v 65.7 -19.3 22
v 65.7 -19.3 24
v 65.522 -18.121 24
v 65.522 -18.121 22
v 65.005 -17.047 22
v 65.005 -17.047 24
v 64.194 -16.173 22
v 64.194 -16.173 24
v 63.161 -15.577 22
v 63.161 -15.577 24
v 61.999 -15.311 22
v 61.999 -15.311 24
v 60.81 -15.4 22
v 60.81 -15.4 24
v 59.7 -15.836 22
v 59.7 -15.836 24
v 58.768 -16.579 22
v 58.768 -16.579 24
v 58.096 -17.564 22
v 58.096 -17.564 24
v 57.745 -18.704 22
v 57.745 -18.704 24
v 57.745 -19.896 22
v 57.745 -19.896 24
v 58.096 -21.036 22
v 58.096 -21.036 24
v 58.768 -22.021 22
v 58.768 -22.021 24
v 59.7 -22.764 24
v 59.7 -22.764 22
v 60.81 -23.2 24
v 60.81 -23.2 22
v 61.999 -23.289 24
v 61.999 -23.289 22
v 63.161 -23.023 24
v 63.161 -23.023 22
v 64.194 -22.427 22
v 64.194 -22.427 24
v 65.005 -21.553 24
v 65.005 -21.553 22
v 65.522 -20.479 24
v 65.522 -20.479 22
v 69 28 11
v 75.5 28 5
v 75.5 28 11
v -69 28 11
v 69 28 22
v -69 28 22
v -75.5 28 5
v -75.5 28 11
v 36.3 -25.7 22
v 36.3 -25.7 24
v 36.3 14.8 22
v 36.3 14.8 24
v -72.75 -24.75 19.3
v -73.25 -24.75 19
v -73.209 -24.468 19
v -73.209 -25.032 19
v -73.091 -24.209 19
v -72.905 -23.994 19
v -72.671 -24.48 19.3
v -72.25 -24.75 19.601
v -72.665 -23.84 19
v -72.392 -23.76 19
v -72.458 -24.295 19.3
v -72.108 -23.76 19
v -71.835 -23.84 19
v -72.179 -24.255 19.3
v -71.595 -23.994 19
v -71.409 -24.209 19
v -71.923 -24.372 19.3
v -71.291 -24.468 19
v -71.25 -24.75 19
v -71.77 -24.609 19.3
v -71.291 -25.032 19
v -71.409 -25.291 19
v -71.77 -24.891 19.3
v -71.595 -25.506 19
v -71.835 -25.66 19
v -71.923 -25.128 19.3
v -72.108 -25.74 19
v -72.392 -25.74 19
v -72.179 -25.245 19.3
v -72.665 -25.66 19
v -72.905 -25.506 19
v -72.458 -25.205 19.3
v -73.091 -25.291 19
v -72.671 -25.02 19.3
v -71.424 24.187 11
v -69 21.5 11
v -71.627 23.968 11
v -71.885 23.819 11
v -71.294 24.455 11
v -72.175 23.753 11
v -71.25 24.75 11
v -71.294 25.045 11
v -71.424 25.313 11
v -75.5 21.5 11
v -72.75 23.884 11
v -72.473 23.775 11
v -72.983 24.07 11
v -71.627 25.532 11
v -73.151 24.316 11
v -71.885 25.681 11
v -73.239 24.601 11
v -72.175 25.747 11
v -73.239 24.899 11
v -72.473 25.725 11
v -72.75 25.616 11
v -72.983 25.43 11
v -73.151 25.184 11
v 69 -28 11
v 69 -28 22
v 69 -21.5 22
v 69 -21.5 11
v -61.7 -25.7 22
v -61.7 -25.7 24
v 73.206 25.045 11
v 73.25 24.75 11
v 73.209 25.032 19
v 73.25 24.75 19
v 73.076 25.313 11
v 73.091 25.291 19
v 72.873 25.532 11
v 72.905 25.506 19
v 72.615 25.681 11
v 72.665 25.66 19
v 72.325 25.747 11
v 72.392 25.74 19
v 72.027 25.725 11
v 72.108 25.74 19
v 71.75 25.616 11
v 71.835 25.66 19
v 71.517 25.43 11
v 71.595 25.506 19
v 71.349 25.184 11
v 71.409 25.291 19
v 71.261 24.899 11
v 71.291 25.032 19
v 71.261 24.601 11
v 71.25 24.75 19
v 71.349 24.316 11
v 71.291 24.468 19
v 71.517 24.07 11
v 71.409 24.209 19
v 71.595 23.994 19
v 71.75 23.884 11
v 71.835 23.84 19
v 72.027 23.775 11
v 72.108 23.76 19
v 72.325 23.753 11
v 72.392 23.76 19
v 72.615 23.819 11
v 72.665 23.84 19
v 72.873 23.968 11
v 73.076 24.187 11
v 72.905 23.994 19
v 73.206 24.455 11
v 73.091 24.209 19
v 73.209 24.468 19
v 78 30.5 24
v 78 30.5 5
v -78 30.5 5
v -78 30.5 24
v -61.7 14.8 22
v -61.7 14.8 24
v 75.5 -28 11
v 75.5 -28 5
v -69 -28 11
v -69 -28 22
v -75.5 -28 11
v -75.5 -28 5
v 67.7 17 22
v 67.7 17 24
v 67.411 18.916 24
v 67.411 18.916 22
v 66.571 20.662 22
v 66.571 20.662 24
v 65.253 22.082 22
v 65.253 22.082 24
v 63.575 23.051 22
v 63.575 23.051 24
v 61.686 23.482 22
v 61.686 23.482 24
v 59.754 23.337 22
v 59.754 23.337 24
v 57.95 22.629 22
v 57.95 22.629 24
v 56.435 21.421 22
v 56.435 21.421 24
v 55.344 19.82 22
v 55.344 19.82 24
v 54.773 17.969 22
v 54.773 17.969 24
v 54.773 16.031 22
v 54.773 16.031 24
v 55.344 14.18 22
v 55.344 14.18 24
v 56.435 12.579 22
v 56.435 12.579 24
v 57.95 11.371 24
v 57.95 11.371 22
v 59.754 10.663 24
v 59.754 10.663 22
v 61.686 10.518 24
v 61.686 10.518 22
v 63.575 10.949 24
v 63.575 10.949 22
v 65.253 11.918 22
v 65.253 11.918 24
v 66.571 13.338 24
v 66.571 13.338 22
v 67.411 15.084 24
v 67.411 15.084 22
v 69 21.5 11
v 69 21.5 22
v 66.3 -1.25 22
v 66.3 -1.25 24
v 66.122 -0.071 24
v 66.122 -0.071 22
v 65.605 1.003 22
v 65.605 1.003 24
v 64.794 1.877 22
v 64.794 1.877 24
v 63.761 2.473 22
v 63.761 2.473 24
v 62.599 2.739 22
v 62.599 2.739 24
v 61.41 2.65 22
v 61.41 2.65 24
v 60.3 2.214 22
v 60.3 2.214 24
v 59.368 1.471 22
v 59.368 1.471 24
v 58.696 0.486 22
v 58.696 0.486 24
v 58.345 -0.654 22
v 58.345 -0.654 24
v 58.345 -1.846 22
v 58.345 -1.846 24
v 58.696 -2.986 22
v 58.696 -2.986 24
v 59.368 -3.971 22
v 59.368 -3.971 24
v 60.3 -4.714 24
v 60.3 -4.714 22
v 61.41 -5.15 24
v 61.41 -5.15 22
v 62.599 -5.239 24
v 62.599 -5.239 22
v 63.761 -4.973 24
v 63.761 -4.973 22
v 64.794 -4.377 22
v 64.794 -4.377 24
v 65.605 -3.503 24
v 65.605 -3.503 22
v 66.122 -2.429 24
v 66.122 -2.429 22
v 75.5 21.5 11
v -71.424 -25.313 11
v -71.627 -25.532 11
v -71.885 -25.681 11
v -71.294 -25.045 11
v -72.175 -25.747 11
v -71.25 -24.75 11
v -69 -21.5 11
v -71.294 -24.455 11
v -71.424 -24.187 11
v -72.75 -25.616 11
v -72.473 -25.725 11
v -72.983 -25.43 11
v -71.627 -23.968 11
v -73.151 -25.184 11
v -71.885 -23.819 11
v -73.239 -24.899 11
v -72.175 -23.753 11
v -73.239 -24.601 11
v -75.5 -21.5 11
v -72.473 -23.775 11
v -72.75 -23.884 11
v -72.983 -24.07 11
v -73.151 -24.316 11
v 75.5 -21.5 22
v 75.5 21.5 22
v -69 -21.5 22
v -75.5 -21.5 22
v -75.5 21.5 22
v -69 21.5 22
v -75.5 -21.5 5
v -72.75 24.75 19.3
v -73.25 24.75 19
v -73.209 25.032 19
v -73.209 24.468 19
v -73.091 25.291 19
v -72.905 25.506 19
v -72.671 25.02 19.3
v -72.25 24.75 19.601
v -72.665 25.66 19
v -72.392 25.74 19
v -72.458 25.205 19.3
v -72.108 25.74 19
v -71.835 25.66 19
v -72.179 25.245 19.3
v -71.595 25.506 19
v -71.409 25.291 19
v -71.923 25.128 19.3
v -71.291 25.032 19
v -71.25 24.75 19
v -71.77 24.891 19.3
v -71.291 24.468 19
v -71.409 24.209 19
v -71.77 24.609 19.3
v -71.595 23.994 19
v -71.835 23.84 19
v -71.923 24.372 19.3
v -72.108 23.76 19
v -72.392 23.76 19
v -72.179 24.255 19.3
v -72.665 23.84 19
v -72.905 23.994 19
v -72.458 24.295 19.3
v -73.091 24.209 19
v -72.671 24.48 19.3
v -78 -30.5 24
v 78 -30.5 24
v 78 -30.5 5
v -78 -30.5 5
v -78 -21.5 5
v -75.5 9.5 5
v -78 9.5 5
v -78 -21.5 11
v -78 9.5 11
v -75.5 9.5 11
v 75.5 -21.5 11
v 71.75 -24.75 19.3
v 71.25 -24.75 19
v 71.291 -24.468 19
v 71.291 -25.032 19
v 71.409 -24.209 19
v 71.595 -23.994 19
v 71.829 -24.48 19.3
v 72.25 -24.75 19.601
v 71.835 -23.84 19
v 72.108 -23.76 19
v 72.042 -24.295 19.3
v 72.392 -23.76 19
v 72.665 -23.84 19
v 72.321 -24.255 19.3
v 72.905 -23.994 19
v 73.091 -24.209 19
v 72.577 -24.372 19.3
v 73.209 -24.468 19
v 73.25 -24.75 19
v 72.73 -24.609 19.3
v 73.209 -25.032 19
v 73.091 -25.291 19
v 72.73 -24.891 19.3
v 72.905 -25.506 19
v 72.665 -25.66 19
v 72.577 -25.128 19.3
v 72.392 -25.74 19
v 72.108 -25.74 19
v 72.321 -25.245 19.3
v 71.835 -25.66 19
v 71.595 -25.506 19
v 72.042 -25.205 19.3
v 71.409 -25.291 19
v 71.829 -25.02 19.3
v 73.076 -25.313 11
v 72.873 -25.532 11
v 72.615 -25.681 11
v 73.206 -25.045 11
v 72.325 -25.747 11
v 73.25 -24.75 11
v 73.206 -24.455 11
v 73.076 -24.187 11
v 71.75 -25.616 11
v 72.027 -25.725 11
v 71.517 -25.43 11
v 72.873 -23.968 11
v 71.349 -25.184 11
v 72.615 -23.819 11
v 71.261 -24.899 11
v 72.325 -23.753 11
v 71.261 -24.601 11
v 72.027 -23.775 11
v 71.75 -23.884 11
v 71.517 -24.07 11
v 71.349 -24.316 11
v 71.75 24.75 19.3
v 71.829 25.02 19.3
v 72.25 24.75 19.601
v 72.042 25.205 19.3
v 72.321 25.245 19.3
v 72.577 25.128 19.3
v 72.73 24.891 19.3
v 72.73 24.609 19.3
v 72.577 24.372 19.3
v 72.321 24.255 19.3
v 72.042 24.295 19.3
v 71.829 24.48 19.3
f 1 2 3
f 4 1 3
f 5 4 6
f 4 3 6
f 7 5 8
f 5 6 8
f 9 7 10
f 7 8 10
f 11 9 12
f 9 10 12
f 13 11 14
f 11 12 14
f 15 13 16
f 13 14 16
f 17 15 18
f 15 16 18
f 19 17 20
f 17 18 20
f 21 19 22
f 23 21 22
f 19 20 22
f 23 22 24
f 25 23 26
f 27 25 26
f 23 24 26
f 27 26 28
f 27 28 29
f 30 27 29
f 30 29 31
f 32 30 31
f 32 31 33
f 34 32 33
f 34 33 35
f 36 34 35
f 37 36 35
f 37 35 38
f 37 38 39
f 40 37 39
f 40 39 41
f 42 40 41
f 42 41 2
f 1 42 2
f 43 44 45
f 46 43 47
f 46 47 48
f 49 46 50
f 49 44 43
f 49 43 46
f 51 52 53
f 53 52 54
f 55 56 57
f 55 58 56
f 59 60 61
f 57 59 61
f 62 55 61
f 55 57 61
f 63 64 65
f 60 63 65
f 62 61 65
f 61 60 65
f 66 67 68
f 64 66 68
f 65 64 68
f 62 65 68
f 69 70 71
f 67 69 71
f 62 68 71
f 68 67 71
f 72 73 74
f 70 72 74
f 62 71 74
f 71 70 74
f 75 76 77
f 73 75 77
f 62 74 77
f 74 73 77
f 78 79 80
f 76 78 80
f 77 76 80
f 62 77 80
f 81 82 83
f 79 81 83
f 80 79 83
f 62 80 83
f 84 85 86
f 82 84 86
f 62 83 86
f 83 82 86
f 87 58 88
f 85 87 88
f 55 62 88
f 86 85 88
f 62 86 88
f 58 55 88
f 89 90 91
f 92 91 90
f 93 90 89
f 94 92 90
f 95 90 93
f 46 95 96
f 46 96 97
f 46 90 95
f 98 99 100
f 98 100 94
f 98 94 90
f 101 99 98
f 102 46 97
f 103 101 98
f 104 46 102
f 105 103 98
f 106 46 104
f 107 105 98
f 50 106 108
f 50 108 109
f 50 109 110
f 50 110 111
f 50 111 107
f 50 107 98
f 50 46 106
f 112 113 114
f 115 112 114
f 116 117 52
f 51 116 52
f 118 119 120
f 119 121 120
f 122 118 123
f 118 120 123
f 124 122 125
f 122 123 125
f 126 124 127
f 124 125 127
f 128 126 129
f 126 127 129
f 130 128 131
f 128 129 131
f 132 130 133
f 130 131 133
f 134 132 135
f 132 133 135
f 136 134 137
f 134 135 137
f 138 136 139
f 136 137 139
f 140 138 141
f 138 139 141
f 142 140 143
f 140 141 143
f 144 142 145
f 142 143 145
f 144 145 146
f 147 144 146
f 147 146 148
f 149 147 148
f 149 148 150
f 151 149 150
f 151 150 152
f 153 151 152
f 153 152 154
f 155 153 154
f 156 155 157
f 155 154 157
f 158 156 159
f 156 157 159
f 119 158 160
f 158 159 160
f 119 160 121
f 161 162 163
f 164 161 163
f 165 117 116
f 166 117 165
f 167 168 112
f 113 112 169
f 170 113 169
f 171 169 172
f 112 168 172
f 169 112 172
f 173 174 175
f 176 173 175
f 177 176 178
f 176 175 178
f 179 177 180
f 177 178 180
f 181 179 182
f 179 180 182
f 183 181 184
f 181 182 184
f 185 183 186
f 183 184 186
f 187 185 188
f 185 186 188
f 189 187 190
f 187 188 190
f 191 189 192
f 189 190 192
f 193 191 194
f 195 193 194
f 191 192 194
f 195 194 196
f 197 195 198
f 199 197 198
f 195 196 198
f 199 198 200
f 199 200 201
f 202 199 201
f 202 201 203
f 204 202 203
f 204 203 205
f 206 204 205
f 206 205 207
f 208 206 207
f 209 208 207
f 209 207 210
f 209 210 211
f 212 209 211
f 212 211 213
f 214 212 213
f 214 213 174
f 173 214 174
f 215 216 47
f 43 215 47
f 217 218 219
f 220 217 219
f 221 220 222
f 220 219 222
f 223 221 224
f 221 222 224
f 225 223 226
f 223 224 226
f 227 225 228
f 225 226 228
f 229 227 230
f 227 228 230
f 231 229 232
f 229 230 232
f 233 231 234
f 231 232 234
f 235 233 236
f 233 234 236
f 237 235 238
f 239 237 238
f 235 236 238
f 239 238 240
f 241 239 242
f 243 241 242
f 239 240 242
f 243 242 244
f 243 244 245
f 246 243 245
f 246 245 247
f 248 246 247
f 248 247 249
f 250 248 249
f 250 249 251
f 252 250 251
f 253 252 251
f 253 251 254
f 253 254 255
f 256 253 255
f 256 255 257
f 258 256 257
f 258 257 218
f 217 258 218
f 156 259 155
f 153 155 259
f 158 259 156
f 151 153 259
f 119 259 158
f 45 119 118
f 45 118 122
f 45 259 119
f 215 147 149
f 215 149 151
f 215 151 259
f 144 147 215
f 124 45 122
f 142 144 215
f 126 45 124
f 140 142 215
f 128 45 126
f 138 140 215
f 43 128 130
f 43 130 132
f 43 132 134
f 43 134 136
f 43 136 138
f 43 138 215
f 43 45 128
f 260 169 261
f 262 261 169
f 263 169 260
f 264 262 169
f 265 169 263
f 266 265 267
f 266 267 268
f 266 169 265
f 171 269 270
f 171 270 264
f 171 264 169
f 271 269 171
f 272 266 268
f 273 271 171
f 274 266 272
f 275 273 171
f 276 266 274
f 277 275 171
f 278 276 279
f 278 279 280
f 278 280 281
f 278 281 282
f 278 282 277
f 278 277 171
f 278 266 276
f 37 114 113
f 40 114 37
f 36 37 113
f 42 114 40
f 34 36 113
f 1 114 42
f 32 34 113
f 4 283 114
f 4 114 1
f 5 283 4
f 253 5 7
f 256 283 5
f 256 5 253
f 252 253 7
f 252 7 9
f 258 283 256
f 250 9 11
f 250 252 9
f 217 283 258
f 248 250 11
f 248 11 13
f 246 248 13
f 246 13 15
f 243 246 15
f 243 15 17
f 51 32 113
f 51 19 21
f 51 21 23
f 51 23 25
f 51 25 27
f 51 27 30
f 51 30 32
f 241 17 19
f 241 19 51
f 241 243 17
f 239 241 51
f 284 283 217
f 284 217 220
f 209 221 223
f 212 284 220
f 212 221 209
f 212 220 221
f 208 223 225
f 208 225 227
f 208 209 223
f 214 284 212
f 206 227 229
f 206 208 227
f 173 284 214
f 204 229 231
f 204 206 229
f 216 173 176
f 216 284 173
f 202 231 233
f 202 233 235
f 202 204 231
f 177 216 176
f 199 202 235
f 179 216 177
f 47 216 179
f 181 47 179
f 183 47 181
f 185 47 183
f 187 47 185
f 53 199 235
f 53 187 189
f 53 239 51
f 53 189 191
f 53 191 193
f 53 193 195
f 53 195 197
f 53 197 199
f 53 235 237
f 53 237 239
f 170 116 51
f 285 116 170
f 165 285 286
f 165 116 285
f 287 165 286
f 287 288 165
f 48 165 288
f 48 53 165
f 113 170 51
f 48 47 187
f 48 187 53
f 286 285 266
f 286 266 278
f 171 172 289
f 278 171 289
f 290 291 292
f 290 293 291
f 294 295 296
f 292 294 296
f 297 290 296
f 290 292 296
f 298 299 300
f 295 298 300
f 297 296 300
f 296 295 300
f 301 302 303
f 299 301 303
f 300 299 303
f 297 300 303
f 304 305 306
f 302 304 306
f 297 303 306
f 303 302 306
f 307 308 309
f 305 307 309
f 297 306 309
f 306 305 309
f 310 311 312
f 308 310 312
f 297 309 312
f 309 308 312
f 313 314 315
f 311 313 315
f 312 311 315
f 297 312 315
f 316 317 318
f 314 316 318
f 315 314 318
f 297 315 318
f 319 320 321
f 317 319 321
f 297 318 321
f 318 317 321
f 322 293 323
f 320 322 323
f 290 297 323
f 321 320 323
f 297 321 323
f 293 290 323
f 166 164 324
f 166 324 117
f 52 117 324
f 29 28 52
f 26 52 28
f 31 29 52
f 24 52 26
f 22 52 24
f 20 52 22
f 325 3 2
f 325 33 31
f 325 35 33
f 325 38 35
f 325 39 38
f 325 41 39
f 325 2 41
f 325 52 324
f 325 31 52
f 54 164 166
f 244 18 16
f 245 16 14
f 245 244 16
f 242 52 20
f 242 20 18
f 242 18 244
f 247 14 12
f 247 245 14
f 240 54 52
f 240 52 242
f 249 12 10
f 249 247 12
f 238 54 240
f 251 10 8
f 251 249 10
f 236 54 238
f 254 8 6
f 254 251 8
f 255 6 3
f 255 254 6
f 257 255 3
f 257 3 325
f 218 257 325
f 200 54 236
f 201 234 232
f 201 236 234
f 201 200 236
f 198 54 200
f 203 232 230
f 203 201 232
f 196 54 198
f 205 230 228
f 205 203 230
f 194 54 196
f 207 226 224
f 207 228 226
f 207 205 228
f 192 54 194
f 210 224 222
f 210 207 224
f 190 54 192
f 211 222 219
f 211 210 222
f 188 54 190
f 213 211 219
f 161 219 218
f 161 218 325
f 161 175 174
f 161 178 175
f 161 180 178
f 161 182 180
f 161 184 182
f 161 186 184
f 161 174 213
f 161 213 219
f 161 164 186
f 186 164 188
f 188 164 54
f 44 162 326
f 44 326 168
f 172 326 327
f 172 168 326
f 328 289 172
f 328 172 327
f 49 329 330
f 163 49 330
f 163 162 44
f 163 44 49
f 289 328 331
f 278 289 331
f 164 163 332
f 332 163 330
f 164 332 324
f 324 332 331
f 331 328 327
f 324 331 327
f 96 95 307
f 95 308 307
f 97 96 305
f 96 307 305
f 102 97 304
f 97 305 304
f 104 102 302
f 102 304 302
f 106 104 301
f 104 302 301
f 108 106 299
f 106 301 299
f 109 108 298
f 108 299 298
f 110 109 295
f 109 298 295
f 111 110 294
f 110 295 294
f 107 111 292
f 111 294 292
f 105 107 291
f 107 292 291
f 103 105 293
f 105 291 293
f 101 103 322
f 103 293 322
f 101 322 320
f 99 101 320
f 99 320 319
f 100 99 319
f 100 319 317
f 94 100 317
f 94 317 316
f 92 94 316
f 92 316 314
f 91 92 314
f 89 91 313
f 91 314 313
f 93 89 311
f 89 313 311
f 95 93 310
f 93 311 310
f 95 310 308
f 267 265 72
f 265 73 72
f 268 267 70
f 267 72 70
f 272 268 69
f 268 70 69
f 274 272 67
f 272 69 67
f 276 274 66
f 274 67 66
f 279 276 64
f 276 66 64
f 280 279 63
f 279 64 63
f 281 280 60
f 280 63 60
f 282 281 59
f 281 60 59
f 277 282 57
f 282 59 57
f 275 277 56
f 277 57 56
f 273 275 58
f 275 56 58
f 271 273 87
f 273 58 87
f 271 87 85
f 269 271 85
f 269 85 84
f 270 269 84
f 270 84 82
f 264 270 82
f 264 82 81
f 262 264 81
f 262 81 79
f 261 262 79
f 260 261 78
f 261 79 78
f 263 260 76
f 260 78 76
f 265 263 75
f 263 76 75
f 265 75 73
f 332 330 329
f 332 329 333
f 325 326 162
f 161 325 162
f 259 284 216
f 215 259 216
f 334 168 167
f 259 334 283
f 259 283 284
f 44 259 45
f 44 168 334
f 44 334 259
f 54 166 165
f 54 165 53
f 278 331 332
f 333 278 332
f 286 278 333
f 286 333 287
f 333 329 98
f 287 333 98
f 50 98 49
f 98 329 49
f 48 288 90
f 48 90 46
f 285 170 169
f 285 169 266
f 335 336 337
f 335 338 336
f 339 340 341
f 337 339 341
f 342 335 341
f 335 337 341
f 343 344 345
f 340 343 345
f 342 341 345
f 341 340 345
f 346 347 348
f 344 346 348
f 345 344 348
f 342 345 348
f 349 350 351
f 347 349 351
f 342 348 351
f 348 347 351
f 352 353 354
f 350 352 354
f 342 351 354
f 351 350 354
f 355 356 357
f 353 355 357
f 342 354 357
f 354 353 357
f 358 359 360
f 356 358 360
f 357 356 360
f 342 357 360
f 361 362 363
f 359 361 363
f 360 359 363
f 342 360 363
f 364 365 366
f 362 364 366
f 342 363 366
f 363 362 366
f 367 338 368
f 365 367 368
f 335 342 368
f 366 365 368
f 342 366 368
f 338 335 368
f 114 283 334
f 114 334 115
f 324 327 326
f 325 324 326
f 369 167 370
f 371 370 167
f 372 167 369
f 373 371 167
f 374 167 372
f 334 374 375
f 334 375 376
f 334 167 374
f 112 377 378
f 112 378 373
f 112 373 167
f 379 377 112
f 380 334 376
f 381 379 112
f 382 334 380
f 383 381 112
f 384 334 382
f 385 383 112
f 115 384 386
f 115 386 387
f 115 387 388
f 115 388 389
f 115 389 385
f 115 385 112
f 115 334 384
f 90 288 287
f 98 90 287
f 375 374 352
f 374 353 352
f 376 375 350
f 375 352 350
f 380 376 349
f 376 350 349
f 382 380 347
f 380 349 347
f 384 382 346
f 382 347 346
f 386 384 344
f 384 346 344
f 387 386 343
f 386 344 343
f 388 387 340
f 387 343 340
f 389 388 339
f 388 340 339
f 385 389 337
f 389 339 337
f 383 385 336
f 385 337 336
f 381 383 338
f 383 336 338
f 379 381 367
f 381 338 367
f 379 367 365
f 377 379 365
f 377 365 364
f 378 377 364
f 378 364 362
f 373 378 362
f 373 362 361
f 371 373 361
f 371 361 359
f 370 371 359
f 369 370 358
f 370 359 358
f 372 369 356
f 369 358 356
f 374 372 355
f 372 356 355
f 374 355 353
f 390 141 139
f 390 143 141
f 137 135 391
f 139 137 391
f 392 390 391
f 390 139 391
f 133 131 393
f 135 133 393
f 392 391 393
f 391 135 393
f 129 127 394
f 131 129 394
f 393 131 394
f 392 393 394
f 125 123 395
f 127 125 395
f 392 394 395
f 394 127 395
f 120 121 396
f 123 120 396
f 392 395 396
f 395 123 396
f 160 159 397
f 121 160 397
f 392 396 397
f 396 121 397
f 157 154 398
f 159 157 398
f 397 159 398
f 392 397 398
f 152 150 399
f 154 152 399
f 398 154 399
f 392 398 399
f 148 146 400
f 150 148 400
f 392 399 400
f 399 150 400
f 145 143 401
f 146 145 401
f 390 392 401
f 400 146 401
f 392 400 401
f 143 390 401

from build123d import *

# Parameters (mm, degrees)
BOSS_EXTRUDE1_DEPTH                                 = 24
SKETCH2_W                                           = 151
SKETCH2_H                                           = 56
CUT_EXTRUDE1_DEPTH                                  = 22
SKETCH3_W                                           = 156
SKETCH3_H                                           = 61
CUT_EXTRUDE2_DEPTH                                  = 5
SKETCH4_R                                           = 6.5
SKETCH4_R_2                                         = 4
SKETCH4_W                                           = 98
SKETCH4_H                                           = 40.5
CUT_EXTRUDE3_DEPTH                                  = 4
CBORE_FOR_M4_HEX_SOCKET_HEAD_CAP_SCREW1_D           = 4.5
CBORE_FOR_M4_HEX_SOCKET_HEAD_CAP_SCREW1_CBORE_D     = 8
CBORE_FOR_M4_HEX_SOCKET_HEAD_CAP_SCREW1_CBORE_DEPTH = 4.4
SKETCH7_W                                           = 6.5
SKETCH7_H                                           = 6.5
BOSS_EXTRUDE2_DEPTH                                 = 11
F_2_0MM_DOWEL_HOLE1_D                               = 2
F_2_0MM_DOWEL_HOLE1_DEPTH                           = 8
F_2_0MM_DOWEL_HOLE1_TIP                             = 0.600860619
SKETCH13_W                                          = 15
SKETCH13_H                                          = 20
CUT_EXTRUDE6_DEPTH                                  = 24
SKETCH14_W                                          = 6
SKETCH14_H                                          = 31
CUT_EXTRUDE7_DEPTH                                  = 3


with BuildPart() as part:
    # Sketch1 → Boss-Extrude1 (new body)
    with BuildSketch(Plane.XY):
        Polygon((-93, 10.5), (-78, 10.5), (-78, -30.5), (78, -30.5), (78, 10.5), (93, 10.5), (93, 30.5), (-93, 30.5), align=None)
    extrude(amount=BOSS_EXTRUDE1_DEPTH)

    # Sketch2 → Cut-Extrude1 (cut)
    with BuildSketch(Plane(origin=(0, 0, 0), x_dir=(-1, 0, 0), z_dir=(0, 0, -1))):
        Rectangle(SKETCH2_W, SKETCH2_H)
    extrude(amount=-CUT_EXTRUDE1_DEPTH, mode=Mode.SUBTRACT)

    # Sketch3 → Cut-Extrude2 (cut)
    with BuildSketch(Plane(origin=(0, 0, 0), x_dir=(-1, 0, 0), z_dir=(0, 0, -1))):
        Rectangle(SKETCH3_W, SKETCH3_H)
    extrude(amount=-CUT_EXTRUDE2_DEPTH, mode=Mode.SUBTRACT)

    # Sketch4 → Cut-Extrude3 (cut)
    with BuildSketch(Plane.XY.offset(24)):
        with Locations((61.2, 17)):
            Circle(SKETCH4_R)
        with Locations((62.3, -1.25)):
            Circle(SKETCH4_R_2)
        with Locations((61.7, -19.3)):
            Circle(SKETCH4_R_2)
        with Locations((-12.7, -5.45)):
            Rectangle(SKETCH4_W, SKETCH4_H)
    extrude(amount=-CUT_EXTRUDE3_DEPTH, mode=Mode.SUBTRACT)

    # CBORE for M4 Hex Socket Head Cap Screw1 (through all)
    with Locations(Plane.XY.offset(24)):
        with Locations((-85, 20.5), (85, 20.376125295)):
            CounterBoreHole(CBORE_FOR_M4_HEX_SOCKET_HEAD_CAP_SCREW1_D / 2, CBORE_FOR_M4_HEX_SOCKET_HEAD_CAP_SCREW1_CBORE_D / 2, CBORE_FOR_M4_HEX_SOCKET_HEAD_CAP_SCREW1_CBORE_DEPTH)

    # Sketch7 → Boss-Extrude2 (add)
    with BuildSketch(Plane(origin=(0, 0, 22), x_dir=(-1, 0, 0), z_dir=(0, 0, -1))):
        with Locations((-72.25, 24.75)):
            Rectangle(SKETCH7_W, SKETCH7_H)
        with Locations((-72.25, -24.75)):
            Rectangle(SKETCH7_W, SKETCH7_H)
        with Locations((72.25, 24.75)):
            Rectangle(SKETCH7_W, SKETCH7_H)
        with Locations((72.25, -24.75)):
            Rectangle(SKETCH7_W, SKETCH7_H)
    extrude(amount=BOSS_EXTRUDE2_DEPTH)

    # Ø2.0mm Dowel Hole1
    with Locations(Plane(origin=(0, 0, 11), x_dir=(-1, 0, 0), z_dir=(0, 0, -1))):
        with Locations((-72.25, 24.75), (-72.25, -24.75), (72.25, 24.75), (72.25, -24.75)):
            Hole(F_2_0MM_DOWEL_HOLE1_D / 2, depth=F_2_0MM_DOWEL_HOLE1_DEPTH)
            with Locations((0, 0, -(F_2_0MM_DOWEL_HOLE1_DEPTH + F_2_0MM_DOWEL_HOLE1_TIP / 2))):  # 118° drill point
                Cone(0, F_2_0MM_DOWEL_HOLE1_D / 2, F_2_0MM_DOWEL_HOLE1_TIP, mode=Mode.SUBTRACT)

    # Sketch13 → Cut-Extrude6 (cut)
    with BuildSketch(Plane(origin=(0, 0, 0), x_dir=(-1, 0, 0), z_dir=(0, 0, -1))):
        with Locations((-85.5, 20.5)):
            Rectangle(SKETCH13_W, SKETCH13_H)
        with Locations((85.5, 20.5)):
            Rectangle(SKETCH13_W, SKETCH13_H)
    extrude(amount=-CUT_EXTRUDE6_DEPTH, mode=Mode.SUBTRACT)

    # Sketch14 → Cut-Extrude7 (cut)
    with BuildSketch(Plane.ZY.offset(78)):
        with Locations((8, -6)):
            Rectangle(SKETCH14_W, SKETCH14_H)
    extrude(amount=-CUT_EXTRUDE7_DEPTH, mode=Mode.SUBTRACT)


solid = part.part
